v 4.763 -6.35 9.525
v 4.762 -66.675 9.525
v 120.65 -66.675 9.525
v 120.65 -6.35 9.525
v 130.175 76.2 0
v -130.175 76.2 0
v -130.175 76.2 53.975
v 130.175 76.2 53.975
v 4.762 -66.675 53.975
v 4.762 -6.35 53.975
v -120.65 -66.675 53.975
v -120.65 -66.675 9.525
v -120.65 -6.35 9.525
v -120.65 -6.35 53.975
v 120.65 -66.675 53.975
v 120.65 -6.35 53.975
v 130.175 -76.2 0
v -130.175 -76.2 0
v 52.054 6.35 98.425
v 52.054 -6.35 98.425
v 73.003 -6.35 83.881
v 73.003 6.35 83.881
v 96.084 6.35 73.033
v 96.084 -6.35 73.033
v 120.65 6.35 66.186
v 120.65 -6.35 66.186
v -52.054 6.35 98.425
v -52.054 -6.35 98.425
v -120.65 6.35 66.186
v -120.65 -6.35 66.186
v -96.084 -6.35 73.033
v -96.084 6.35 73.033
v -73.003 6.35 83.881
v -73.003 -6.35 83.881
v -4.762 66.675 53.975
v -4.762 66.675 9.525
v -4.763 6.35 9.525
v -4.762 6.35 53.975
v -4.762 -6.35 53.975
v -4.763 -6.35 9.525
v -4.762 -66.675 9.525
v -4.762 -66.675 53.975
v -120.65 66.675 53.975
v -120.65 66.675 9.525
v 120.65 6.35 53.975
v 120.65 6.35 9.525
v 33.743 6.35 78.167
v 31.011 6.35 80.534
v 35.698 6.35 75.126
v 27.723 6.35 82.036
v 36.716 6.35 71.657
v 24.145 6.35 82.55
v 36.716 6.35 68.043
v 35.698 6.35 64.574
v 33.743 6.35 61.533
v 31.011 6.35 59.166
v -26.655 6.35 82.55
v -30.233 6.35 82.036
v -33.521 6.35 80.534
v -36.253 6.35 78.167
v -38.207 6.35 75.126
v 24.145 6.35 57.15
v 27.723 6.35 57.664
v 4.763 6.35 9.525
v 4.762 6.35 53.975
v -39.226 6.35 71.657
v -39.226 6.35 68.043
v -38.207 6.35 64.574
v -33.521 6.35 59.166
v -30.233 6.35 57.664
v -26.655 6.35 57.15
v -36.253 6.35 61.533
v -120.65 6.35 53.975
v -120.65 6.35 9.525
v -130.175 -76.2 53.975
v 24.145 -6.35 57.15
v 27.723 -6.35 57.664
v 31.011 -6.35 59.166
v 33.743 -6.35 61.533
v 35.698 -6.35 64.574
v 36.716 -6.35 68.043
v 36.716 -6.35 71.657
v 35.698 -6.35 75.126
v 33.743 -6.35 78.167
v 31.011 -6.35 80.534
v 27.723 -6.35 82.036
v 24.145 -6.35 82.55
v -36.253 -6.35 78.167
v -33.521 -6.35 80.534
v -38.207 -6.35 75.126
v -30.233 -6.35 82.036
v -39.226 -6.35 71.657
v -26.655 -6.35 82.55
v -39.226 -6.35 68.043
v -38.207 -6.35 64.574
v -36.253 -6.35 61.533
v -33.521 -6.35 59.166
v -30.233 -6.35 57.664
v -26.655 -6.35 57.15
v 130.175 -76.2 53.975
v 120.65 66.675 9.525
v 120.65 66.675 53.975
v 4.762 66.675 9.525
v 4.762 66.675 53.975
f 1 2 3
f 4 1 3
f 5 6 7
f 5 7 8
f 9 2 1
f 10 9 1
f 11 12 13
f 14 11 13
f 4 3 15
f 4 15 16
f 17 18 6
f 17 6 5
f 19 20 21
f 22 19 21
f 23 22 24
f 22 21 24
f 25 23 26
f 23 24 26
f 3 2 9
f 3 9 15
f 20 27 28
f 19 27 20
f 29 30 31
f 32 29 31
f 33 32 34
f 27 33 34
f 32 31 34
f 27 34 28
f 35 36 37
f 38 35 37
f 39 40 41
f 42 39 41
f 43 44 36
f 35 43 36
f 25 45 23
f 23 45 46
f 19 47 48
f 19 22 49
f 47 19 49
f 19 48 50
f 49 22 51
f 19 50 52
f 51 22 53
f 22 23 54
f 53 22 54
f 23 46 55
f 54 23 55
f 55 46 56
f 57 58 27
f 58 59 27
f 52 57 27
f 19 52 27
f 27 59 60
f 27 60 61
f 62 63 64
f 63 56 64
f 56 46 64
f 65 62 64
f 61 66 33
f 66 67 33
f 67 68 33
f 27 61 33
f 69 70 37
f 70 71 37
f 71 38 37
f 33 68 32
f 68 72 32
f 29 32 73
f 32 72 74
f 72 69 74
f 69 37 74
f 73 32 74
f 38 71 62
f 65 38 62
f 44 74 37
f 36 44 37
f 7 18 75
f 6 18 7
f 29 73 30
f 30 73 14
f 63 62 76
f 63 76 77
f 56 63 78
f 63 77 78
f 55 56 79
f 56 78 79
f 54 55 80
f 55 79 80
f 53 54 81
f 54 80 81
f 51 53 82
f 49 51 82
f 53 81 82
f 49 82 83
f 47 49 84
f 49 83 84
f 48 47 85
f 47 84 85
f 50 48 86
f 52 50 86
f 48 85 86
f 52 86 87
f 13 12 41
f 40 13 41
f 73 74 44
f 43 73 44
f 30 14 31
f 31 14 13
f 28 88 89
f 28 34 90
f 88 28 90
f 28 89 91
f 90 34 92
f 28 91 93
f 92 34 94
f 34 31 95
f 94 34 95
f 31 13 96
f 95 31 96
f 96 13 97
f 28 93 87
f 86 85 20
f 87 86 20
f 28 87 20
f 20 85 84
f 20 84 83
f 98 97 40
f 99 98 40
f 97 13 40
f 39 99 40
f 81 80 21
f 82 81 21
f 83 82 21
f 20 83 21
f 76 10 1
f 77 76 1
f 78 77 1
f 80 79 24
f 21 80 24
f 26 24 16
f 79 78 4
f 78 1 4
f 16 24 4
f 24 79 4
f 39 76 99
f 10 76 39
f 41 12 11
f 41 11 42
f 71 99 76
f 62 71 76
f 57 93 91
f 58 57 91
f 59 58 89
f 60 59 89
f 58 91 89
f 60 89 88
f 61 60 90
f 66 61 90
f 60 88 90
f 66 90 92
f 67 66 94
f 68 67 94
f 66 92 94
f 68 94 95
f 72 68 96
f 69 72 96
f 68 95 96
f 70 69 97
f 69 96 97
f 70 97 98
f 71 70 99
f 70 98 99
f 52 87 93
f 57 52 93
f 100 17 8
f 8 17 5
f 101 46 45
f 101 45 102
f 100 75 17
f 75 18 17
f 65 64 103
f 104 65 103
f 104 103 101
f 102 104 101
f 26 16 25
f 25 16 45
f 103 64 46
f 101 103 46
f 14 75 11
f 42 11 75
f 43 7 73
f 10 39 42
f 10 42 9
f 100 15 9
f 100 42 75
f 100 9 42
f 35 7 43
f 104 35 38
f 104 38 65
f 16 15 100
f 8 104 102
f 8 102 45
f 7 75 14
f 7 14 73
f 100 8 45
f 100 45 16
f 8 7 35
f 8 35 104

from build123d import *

# Parameters (mm, degrees)
F0_W      = 260.35
F0_H      = 9.525
F1_DEPTH  = 76.2
F2_W      = 260.35
F2_H      = 152.4
F2_W_2    = 241.3
F2_H_2    = 133.35
F3_DEPTH  = 44.45
F5_DEPTH  = 44.45
F7_DEPTH  = 88.9
F9_DEPTH  = 12.7
F11_DEPTH = 223.52


with BuildPart() as f1:
    # F0 (on Front) → F1 (new body, symmetric)
    with BuildSketch(Plane.XZ):
        with Locations((0, 4.7625)):
            Rectangle(F0_W, F0_H)
    extrude(amount=F1_DEPTH, both=True)

    # F2 (on face) → F3 (join)
    with BuildSketch(Plane.XY.offset(9.525)):
        Rectangle(F2_W, F2_H)
        Rectangle(F2_W_2, F2_H_2, mode=Mode.SUBTRACT)
    extrude(amount=F3_DEPTH)

    # F4 (on face) → F5 (join)
    with BuildSketch(Plane.XY.offset(9.525)):
        Polygon((-4.7625, -66.675), (0, -66.675), (4.7625, -66.675), (4.7625, 66.675), (0, 66.675), (-4.7625, 66.675), align=None)
    extrude(amount=F5_DEPTH)

    # F6 (on face) → F7 (join)
    with BuildSketch(Plane.XY.offset(9.525)):
        Polygon((-120.65, 6.35), (-120.65, 0), (-120.65, -6.35), (120.65, -6.35), (120.65, 6.35), align=None)
    extrude(amount=F7_DEPTH)

    # F8 (on face) → F9 (cut)
    with BuildSketch(Plane.XZ.offset(6.35)):
        with BuildLine():
            ThreePointArc((24.1451865613, 57.15), (36.8451865613, 69.85), (24.1451865613, 82.55))
            Line((24.1451865613, 82.55), (-26.6548134387, 82.55))
            ThreePointArc((-26.6548134387, 82.55), (-39.3548134387, 69.85), (-26.6548134387, 57.15))
            Line((-26.6548134387, 57.15), (24.1451865613, 57.15))
        make_face()
    extrude(amount=-F9_DEPTH, mode=Mode.SUBTRACT)

    # F10 (on face) → F11 (cut)
    with BuildSketch(Plane.XZ.offset(76.2)):
        with BuildLine():
            ThreePointArc((0, 247.2596246621), (-267.4707294697, 311.9378914894), (-149.1386400133, 63.5))
            ThreePointArc((-149.1386400133, 63.5), (-53.1007485209, 97.5679105219), (0, 184.5403753379))
            ThreePointArc((0, 184.5403753379), (-3.26136, 215.9), (0, 247.2596246621))
        make_face()
        with BuildLine():
            ThreePointArc((0, 247.2596246621), (-3.26136, 215.9), (0, 184.5403753379))
            ThreePointArc((0, 184.5403753379), (2.4438272183, 200.1356214204), (3.26136, 215.9))
            ThreePointArc((3.26136, 215.9), (2.4438272183, 231.6643785796), (0, 247.2596246621))
        make_face()
        with BuildLine():
            ThreePointArc((0, 184.5403753379), (53.1007485157, 97.5679105261), (149.13864, 63.5))
            ThreePointArc((149.13864, 63.5), (256.9017134528, 108.1369265472), (301.53864, 215.9))
            ThreePointArc((301.53864, 215.9), (164.9030185796, 367.4824672183), (0, 247.2596246621))
            ThreePointArc((0, 247.2596246621), (2.4438272183, 231.6643785796), (3.26136, 215.9))
            ThreePointArc((3.26136, 215.9), (2.4438272183, 200.1356214204), (0, 184.5403753379))
        make_face()
    extrude(amount=-F11_DEPTH, mode=Mode.SUBTRACT)


solid = f1.part
